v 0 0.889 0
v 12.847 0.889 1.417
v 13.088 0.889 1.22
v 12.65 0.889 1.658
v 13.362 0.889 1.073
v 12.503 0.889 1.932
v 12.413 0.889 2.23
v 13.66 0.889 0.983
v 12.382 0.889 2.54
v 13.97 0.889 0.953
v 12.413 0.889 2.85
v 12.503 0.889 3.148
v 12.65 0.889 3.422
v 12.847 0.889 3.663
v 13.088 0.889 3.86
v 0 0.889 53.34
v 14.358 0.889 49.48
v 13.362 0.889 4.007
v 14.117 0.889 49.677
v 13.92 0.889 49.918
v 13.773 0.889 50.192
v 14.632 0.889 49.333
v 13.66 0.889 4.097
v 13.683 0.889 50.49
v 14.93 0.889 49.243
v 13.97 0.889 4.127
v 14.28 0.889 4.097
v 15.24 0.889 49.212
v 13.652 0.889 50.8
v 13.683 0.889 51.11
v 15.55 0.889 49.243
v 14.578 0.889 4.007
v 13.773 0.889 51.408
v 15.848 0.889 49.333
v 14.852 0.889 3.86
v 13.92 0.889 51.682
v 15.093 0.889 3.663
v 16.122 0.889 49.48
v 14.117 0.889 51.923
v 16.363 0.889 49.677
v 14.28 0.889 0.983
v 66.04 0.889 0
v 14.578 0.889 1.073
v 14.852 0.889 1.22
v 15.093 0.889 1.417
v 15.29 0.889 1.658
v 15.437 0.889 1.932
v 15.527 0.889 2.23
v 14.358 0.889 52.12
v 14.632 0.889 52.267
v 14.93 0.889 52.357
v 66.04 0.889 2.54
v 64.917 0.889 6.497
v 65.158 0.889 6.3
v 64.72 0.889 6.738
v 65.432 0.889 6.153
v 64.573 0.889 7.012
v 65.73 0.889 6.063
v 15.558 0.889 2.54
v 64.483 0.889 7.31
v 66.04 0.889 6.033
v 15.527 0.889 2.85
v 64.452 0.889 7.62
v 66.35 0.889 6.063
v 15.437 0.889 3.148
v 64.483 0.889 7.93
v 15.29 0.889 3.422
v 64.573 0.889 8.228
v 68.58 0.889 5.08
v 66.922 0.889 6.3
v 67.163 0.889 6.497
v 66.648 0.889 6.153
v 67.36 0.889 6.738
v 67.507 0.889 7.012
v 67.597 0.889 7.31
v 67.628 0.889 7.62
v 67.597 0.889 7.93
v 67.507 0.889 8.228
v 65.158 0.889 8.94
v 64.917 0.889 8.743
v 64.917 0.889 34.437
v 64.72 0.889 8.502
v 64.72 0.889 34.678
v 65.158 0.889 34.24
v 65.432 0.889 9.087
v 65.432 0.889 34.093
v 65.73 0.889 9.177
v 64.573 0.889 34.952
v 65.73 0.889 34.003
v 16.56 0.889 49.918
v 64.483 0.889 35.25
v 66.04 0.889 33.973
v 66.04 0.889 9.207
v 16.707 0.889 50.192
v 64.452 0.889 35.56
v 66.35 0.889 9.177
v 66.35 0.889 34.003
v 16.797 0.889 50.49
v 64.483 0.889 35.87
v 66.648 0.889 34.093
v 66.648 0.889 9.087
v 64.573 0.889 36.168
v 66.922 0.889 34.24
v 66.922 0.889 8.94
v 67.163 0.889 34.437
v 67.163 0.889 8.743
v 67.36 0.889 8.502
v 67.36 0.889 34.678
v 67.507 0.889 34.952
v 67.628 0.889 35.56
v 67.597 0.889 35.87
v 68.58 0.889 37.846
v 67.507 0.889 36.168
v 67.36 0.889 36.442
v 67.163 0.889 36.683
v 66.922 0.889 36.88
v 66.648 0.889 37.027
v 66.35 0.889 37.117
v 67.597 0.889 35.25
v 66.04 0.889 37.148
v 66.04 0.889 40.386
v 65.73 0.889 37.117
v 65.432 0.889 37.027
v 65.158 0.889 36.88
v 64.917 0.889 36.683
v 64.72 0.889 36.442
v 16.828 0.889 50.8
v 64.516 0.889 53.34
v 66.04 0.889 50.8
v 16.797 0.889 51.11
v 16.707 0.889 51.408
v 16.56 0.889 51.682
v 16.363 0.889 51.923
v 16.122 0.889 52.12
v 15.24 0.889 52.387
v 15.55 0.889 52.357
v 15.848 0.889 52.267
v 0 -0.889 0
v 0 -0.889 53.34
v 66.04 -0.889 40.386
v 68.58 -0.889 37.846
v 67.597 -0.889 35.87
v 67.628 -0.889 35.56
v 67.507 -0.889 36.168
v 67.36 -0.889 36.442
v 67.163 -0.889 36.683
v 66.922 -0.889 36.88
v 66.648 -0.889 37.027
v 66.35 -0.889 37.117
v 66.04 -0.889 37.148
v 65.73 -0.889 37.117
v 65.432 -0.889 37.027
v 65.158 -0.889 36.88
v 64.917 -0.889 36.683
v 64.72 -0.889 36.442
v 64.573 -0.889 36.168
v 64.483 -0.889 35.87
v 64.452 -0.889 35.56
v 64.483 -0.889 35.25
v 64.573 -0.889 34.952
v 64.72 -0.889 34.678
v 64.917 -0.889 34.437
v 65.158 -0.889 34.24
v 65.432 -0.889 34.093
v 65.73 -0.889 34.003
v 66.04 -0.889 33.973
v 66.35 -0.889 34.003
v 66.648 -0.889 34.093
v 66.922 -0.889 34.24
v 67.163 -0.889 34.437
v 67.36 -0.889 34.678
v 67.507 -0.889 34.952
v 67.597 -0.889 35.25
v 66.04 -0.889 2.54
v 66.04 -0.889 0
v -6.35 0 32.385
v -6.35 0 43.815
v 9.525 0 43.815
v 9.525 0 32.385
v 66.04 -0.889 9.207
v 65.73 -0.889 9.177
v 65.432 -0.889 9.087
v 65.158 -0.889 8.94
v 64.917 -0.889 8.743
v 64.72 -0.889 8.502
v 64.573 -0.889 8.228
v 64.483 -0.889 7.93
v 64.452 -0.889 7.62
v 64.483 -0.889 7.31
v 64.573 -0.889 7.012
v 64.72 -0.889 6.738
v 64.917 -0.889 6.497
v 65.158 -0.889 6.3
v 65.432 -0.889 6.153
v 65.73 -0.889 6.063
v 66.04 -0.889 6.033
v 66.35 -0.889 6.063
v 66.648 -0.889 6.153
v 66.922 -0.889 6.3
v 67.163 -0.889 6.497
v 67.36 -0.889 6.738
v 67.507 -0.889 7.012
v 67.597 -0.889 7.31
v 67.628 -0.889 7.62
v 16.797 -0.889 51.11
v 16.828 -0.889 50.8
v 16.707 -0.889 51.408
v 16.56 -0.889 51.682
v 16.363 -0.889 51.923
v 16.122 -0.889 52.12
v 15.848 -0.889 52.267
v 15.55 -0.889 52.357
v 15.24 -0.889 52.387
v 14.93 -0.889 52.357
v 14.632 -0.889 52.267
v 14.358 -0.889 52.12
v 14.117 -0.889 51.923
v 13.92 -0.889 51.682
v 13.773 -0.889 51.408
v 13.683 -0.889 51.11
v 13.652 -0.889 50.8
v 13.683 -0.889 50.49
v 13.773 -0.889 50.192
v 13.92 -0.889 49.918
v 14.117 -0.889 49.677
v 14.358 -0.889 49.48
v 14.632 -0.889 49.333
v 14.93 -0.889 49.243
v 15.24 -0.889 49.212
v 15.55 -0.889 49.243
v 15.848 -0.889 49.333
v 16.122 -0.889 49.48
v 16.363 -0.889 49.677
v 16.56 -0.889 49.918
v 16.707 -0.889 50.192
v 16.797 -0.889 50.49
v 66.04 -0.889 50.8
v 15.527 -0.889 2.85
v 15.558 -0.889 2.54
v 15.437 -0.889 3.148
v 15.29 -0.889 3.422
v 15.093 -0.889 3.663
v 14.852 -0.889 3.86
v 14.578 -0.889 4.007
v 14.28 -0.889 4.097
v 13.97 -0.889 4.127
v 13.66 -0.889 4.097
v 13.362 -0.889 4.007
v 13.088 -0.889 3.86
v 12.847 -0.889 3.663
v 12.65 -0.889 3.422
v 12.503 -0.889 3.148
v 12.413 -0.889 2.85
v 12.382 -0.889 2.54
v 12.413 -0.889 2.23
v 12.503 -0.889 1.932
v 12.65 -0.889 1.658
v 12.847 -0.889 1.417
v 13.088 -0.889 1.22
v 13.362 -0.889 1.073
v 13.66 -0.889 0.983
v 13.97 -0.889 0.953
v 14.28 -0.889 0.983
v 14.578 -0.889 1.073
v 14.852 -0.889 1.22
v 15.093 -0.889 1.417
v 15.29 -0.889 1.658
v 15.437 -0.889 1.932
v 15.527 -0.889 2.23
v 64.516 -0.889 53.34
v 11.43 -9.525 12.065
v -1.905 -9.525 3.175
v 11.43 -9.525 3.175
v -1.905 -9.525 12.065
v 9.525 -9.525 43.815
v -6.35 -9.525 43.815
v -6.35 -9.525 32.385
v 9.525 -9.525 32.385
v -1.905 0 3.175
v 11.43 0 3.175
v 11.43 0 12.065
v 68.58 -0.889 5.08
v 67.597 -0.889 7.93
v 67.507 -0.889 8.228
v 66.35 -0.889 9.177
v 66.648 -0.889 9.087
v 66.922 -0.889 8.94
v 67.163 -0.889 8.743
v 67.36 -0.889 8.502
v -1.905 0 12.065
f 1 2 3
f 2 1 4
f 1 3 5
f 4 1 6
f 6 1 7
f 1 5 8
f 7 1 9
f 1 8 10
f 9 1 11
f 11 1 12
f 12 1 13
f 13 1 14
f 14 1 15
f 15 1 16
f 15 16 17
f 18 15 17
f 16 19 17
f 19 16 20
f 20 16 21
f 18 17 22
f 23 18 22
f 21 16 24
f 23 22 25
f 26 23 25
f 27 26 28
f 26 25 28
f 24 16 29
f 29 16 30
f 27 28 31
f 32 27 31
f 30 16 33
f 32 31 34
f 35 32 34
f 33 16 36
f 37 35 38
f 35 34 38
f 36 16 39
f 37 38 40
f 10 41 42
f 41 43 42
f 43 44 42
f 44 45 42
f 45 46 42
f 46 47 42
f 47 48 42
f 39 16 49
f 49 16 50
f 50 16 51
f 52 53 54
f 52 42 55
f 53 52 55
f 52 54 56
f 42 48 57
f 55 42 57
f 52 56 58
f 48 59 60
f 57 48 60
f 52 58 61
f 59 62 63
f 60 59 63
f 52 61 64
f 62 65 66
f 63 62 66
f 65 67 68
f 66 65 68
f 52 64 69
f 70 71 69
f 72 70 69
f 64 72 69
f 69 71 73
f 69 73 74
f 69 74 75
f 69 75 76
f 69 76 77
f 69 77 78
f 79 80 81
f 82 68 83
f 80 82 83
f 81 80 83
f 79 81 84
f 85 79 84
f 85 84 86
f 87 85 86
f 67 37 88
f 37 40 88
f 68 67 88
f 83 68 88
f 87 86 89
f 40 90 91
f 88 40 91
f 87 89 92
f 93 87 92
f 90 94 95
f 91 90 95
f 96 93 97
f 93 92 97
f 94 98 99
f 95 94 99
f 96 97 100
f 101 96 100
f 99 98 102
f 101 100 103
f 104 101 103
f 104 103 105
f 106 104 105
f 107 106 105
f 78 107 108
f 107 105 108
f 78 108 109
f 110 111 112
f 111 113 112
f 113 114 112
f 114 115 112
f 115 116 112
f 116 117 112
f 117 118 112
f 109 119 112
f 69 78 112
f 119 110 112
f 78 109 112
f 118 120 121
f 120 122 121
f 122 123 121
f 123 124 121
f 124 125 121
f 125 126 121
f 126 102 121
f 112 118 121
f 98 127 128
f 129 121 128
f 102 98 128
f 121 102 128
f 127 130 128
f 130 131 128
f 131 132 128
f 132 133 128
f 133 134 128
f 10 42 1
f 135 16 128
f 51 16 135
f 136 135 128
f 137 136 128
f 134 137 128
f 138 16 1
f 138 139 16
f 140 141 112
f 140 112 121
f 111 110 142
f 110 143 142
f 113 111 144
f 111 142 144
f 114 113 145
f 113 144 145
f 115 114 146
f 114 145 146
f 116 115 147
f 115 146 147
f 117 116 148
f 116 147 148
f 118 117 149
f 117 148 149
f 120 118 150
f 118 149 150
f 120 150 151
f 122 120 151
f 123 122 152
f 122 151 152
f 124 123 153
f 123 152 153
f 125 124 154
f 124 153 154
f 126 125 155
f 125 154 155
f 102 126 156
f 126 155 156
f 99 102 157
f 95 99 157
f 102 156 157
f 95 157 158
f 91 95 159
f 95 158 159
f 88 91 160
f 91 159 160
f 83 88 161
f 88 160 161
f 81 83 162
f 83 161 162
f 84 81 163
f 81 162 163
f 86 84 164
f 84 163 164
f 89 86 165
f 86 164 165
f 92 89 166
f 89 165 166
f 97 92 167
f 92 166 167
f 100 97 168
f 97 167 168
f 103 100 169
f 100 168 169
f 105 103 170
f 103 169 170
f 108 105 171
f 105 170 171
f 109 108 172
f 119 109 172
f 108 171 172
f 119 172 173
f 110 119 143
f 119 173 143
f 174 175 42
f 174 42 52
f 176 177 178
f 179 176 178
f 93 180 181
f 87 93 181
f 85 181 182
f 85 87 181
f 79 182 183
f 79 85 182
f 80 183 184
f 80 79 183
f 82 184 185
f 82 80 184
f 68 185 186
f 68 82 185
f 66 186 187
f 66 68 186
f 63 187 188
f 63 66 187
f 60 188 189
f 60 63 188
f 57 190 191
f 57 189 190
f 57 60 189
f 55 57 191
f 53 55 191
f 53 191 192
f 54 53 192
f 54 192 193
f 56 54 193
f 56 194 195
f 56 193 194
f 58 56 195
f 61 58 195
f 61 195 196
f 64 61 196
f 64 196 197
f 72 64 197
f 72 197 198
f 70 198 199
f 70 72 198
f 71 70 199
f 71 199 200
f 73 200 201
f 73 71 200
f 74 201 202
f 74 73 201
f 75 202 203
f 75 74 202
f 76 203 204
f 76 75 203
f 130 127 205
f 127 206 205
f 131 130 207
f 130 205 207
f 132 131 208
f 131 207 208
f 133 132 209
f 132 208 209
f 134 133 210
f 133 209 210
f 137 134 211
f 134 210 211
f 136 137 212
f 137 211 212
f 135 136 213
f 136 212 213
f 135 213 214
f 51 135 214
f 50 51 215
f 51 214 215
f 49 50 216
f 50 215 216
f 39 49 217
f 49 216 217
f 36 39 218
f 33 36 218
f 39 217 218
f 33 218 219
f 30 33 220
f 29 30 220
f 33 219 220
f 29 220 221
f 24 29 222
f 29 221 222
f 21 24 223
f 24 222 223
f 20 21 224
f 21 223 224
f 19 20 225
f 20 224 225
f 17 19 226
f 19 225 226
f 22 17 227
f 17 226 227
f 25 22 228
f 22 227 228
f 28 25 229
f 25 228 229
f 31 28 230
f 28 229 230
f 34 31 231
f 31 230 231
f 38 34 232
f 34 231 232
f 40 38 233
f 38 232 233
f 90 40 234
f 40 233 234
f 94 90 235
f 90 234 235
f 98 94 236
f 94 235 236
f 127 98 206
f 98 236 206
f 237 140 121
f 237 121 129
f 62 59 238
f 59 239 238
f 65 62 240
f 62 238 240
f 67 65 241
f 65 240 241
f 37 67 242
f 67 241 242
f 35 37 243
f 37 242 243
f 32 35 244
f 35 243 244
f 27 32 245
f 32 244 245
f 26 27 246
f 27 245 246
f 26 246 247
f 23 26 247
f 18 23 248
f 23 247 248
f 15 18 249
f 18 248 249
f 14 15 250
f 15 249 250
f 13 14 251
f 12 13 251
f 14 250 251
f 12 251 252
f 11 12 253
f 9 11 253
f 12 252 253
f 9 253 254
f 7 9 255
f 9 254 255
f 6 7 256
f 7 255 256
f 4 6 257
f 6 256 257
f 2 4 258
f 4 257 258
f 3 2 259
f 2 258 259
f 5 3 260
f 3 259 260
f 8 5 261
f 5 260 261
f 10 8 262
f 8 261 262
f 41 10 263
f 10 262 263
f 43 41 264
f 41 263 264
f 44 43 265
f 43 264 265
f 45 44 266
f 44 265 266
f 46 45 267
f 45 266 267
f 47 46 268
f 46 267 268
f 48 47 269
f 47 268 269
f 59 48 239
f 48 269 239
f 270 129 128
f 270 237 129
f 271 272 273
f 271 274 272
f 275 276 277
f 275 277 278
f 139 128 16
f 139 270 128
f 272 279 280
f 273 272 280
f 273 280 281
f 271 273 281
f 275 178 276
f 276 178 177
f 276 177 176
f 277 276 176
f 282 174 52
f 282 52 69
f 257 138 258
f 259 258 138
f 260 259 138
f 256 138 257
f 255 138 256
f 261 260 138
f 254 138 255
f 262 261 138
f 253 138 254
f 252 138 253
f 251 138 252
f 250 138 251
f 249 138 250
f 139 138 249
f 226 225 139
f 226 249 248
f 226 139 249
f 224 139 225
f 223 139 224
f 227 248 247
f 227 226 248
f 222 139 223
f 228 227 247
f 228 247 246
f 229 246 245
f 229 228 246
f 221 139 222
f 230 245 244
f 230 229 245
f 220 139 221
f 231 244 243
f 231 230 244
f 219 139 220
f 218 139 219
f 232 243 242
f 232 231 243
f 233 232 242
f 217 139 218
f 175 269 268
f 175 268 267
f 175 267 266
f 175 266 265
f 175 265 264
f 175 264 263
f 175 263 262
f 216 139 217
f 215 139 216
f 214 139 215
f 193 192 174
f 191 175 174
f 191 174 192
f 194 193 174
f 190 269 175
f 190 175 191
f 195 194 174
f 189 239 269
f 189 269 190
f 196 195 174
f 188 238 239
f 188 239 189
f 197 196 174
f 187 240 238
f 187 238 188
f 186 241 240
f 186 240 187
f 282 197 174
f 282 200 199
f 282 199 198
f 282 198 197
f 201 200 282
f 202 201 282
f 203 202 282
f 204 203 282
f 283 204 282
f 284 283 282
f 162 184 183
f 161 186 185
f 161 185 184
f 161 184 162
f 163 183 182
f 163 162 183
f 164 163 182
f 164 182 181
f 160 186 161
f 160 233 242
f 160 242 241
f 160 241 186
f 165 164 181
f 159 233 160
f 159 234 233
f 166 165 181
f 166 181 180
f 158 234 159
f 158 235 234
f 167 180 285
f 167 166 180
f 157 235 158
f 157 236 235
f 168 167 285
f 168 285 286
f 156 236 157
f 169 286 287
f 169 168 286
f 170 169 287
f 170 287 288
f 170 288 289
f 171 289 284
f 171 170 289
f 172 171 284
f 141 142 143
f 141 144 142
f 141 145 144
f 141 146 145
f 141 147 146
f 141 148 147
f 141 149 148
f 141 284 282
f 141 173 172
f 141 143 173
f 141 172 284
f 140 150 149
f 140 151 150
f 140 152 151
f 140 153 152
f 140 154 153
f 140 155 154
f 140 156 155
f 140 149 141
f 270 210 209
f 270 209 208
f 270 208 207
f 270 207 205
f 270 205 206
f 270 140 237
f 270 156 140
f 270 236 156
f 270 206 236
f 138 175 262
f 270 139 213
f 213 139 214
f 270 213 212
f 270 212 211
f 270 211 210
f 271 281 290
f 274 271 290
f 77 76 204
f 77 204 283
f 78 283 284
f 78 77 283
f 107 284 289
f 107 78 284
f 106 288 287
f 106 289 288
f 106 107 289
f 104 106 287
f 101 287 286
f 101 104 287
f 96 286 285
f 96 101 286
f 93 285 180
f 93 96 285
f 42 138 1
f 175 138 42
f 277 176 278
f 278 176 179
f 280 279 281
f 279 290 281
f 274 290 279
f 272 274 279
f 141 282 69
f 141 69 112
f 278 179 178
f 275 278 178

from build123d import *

# Parameters (mm, degrees)
F3_DEPTH = 0.889
F4_DEPTH = 9.525
F2_R     = 1.5875
F5_DEPTH = 12.7


with BuildPart() as f3:
    # F0 (on Front) → F3 (new body, symmetric)
    with BuildSketch(Plane.XZ):
        Polygon((0, 53.34), (0, 0), (66.04, 0), (66.04, 2.54), (68.58, 5.08), (68.58, 37.846), (66.04, 40.386), (66.04, 50.8), (64.516, 53.34), align=None)
    extrude(amount=F3_DEPTH, both=True)

    # F2 (on face) → F5 (cut, symmetric)
    with BuildSketch(Plane.XZ):
        with Locations((15.24, 50.8)):
            Circle(F2_R)
        with Locations((13.97, 2.54)):
            Circle(F2_R)
        with BuildLine():
            ThreePointArc((66.04, 6.0325), (67.162532, 6.497468), (67.6275, 7.62))
            ThreePointArc((67.6275, 7.62), (67.162532, 8.742532), (66.04, 9.2075))
            Line((66.04, 9.2075), (66.04, 6.0325))
        make_face()
        with BuildLine():
            Line((66.04, 6.0325), (66.04, 9.2075))
            ThreePointArc((66.04, 9.2075), (64.4525, 7.62), (66.04, 6.0325))
        make_face()
        with Locations((66.04, 35.56)):
            Circle(F2_R)
    extrude(amount=F5_DEPTH, both=True, mode=Mode.SUBTRACT)


with BuildPart() as f4:
    # F1 (on Front) → F4 (new body)
    with BuildSketch(Plane.XZ):
        Polygon((-1.905, 3.175), (0, 3.175), (11.43, 3.175), (11.43, 12.065), (0, 12.065), (-1.905, 12.065), align=None)
        Polygon((-6.35, 43.815), (-6.35, 32.385), (0, 32.385), (9.525, 32.385), (9.525, 43.815), align=None)
    extrude(amount=F4_DEPTH)


solid = Compound([f3.part, f4.part])
